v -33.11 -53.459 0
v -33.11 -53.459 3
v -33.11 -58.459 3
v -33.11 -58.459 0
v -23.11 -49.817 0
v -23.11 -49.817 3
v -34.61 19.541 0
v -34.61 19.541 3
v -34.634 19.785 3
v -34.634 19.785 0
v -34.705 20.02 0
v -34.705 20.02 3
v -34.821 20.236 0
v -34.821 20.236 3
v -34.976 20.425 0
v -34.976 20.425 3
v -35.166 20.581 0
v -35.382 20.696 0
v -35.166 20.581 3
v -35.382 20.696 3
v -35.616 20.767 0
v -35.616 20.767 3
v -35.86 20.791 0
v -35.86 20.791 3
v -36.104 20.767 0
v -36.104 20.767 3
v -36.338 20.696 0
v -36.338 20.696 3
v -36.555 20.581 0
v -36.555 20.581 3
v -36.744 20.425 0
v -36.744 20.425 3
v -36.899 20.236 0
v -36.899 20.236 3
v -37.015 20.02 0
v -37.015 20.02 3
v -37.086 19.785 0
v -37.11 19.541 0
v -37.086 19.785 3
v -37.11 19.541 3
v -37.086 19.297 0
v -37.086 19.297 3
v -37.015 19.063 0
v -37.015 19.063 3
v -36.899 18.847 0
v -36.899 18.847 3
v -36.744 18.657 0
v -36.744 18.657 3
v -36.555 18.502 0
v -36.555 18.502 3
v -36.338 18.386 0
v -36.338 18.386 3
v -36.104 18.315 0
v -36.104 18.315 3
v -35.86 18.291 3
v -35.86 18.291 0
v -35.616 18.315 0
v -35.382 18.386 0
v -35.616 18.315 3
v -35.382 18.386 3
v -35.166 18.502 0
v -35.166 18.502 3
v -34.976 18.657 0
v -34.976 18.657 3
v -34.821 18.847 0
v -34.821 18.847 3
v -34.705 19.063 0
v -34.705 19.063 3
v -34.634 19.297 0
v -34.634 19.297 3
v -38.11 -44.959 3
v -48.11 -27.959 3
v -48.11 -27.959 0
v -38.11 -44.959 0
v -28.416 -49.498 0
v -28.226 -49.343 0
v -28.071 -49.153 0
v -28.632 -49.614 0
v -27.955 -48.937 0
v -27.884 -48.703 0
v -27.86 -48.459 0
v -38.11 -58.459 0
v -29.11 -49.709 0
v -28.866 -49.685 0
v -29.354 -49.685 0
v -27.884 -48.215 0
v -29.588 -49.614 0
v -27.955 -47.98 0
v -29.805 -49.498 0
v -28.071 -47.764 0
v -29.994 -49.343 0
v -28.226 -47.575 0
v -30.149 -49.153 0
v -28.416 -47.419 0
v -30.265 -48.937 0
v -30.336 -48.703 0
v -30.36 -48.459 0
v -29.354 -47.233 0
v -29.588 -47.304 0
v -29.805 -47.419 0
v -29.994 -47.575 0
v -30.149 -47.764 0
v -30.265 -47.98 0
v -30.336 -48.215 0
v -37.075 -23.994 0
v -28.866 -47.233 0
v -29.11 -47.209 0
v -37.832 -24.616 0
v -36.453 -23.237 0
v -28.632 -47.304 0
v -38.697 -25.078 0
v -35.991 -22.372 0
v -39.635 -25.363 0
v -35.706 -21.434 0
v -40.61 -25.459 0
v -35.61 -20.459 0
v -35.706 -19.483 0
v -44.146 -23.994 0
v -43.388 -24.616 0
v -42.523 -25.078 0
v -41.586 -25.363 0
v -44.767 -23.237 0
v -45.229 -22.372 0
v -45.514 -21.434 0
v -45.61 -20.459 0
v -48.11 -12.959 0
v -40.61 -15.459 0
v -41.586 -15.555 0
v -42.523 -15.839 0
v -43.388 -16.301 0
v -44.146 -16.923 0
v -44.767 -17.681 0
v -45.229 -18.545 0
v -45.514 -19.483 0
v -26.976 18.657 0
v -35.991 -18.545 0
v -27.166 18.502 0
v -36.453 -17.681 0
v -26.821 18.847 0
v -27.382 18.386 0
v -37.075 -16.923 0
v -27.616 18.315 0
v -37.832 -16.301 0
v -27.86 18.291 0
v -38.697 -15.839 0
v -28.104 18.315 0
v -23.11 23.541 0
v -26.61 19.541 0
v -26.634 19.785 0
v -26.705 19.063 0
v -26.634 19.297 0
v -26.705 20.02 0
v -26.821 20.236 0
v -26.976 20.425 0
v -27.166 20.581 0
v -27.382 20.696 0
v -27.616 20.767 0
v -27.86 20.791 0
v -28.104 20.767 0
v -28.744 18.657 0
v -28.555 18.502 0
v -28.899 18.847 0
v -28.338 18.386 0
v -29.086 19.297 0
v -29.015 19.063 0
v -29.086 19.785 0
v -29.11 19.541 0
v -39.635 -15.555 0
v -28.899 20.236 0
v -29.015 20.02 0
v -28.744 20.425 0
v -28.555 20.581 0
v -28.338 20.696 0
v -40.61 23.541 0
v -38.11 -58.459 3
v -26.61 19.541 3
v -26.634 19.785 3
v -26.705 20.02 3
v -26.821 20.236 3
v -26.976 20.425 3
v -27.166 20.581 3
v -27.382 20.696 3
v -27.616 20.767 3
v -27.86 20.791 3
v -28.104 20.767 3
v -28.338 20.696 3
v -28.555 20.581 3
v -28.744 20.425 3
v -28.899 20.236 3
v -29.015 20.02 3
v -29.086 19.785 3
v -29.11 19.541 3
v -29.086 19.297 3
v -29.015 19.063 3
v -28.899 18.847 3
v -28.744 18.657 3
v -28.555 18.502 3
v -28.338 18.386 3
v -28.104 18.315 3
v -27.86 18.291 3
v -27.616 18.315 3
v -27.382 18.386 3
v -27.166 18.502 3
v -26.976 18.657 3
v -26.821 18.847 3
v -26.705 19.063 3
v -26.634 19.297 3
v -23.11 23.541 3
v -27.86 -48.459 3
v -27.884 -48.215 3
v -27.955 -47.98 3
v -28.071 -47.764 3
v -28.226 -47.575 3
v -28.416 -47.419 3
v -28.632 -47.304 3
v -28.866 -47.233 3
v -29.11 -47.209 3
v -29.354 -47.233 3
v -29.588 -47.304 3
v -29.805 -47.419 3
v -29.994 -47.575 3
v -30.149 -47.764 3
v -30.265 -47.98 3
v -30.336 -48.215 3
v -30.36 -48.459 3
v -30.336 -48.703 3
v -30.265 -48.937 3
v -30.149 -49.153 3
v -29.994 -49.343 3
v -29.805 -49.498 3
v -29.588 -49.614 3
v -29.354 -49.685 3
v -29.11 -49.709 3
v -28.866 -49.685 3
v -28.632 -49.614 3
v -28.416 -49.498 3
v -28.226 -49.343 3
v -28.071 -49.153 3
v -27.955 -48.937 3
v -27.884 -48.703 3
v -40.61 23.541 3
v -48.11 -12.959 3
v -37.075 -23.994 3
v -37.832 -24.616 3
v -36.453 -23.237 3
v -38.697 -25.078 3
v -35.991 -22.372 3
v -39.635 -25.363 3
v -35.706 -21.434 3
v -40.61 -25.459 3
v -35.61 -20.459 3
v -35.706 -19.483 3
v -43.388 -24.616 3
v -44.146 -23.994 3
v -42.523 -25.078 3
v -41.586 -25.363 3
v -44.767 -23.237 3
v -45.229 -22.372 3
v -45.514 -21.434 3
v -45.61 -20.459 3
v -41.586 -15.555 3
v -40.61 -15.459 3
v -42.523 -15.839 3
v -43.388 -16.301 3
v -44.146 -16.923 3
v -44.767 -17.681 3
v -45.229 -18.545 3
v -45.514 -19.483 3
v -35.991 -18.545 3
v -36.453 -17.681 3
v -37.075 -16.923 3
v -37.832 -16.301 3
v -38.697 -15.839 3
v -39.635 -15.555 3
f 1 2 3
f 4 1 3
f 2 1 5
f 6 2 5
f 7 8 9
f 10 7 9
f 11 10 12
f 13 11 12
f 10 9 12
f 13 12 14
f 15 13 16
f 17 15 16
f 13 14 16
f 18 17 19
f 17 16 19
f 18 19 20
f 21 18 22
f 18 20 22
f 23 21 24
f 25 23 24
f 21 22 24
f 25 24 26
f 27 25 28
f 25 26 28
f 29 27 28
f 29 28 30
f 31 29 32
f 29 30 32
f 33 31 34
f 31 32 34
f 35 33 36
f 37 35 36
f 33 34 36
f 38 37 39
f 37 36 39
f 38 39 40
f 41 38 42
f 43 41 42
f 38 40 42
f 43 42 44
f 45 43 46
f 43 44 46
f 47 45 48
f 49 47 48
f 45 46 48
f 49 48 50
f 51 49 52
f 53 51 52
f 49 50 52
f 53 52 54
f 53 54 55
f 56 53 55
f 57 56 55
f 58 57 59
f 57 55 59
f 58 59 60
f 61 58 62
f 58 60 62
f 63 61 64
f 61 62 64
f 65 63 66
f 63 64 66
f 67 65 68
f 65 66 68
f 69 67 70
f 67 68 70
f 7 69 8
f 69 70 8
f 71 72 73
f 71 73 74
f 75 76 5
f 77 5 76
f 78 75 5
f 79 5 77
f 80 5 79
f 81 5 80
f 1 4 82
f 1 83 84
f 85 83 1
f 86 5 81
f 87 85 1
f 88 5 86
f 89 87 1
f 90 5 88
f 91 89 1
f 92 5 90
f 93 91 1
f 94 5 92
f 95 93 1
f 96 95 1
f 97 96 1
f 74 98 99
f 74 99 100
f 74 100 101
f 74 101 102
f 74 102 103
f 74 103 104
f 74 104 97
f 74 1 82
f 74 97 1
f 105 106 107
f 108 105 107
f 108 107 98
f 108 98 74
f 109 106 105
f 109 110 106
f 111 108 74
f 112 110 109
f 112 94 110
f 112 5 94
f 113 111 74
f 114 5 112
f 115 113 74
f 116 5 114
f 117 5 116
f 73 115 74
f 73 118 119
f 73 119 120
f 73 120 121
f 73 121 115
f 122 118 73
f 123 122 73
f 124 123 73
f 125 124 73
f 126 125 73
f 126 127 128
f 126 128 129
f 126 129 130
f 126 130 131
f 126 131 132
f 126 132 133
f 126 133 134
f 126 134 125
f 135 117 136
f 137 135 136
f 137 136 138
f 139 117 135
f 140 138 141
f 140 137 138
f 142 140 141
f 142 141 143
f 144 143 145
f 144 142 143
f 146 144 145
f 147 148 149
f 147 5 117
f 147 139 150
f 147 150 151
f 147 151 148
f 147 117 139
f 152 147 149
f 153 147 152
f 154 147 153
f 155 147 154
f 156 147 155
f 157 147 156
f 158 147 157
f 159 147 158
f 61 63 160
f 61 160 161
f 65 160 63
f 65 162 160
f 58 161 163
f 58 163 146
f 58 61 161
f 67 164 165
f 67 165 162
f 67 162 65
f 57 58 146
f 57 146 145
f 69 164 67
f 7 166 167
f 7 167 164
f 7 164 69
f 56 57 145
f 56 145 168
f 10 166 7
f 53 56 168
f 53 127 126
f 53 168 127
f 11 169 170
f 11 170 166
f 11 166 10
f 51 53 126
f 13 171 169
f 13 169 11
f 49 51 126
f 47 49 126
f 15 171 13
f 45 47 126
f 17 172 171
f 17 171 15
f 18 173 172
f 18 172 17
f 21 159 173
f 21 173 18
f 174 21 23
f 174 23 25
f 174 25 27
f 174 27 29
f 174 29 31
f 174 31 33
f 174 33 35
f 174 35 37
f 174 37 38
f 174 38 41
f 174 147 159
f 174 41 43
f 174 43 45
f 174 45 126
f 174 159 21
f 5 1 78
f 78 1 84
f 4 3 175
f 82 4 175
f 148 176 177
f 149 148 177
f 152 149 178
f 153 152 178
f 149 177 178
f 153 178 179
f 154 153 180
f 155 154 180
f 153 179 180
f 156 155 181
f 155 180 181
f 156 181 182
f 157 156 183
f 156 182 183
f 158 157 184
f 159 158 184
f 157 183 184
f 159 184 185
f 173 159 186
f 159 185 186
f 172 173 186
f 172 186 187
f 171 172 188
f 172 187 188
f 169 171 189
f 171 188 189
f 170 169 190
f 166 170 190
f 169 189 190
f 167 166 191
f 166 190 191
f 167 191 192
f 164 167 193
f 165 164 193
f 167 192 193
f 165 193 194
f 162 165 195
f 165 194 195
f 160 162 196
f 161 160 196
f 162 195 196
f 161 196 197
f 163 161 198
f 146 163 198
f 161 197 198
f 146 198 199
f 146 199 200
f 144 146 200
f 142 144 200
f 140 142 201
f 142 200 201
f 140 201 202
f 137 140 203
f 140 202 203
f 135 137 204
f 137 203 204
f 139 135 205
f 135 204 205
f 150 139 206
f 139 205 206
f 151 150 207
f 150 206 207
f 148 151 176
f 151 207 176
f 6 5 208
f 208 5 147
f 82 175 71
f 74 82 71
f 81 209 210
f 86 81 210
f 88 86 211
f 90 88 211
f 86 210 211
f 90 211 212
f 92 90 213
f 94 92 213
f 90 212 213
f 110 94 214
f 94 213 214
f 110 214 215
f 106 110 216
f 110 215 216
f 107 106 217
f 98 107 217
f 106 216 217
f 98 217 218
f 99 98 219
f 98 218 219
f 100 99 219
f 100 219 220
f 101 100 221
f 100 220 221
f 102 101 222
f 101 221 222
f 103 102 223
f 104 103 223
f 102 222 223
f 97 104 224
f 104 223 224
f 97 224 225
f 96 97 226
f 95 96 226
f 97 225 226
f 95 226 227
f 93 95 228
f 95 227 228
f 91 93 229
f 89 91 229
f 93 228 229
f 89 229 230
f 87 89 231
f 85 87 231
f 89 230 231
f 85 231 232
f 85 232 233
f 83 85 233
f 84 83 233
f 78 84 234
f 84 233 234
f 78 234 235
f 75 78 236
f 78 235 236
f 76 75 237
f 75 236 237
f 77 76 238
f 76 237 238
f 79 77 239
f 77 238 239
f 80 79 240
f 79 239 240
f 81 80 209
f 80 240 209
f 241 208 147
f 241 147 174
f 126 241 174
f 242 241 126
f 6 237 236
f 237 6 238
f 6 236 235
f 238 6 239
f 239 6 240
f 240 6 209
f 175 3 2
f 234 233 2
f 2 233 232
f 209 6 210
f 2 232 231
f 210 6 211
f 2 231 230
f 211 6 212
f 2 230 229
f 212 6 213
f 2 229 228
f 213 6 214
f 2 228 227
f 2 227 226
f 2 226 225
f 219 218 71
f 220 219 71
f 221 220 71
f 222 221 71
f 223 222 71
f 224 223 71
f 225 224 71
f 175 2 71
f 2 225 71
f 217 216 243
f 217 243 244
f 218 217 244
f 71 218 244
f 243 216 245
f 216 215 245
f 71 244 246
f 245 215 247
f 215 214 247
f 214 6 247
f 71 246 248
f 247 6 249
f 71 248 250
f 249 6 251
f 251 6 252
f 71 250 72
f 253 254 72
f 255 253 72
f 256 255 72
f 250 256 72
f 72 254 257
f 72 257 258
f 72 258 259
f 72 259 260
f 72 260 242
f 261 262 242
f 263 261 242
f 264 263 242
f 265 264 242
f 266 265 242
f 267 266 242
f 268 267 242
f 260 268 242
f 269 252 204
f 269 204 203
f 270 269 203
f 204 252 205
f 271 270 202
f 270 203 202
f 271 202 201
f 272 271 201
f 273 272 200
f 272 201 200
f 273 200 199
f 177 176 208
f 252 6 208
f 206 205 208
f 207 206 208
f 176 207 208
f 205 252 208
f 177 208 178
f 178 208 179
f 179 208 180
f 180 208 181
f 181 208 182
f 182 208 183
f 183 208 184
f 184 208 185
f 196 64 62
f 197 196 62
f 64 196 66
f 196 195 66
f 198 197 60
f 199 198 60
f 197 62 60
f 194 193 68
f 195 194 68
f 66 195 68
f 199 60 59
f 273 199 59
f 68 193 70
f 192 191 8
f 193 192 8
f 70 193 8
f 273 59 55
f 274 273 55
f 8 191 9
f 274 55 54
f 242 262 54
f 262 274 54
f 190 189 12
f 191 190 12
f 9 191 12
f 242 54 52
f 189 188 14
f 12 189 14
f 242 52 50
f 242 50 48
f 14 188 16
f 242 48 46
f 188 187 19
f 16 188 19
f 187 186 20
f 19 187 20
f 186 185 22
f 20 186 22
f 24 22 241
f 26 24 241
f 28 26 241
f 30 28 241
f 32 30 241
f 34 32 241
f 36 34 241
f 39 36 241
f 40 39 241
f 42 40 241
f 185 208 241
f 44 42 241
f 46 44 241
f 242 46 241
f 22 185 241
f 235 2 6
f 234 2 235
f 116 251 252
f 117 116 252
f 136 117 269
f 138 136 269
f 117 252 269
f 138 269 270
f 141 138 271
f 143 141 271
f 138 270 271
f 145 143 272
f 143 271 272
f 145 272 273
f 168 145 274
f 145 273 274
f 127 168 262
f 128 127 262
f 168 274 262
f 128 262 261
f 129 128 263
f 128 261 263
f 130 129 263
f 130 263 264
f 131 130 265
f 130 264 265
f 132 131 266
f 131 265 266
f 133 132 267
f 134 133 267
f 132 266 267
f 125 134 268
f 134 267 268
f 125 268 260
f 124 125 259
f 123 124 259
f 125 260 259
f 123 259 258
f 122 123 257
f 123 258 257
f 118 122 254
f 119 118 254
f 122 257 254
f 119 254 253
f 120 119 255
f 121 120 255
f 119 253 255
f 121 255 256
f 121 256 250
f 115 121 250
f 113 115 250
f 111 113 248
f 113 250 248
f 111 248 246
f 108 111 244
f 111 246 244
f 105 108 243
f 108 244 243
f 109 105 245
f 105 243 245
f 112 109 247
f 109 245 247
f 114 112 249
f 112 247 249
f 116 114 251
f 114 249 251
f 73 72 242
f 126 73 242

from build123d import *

# Parameters (mm, degrees)
SKETCH1_W           = 10
SKETCH1_H           = 77
BOSS_EXTRUDE1_DEPTH = 3
SKETCH2_W           = 15
SKETCH2_H           = 15
BOSS_EXTRUDE2_DEPTH = 3
BOSS_EXTRUDE3_DEPTH = 3
BOSS_EXTRUDE4_DEPTH = 3
SKETCH5_R           = 5
SKETCH5_R_2         = 1.25
CUT_EXTRUDE1_DEPTH  = 3
CUT_EXTRUDE2_DEPTH  = 10


with BuildPart() as part:
    # Sketch1 → Boss-Extrude1 (new body)
    with BuildSketch(Plane.XY):
        with Locations((-28.110071178, -14.958795526)):
            Rectangle(SKETCH1_W, SKETCH1_H)
    extrude(amount=BOSS_EXTRUDE1_DEPTH)

    # Sketch2 → Boss-Extrude2 (add)
    with BuildSketch(Plane.XY.offset(3)):
        with Locations((-40.610071178, -20.458795526)):
            Rectangle(SKETCH2_W, SKETCH2_H)
    extrude(amount=-BOSS_EXTRUDE2_DEPTH)

    # Sketch3 → Boss-Extrude3 (add)
    with BuildSketch(Plane.XY.offset(3)):
        Polygon((-33.110071178, 23.541204474), (-40.610071178, 23.541204474), (-48.110071178, -12.958795526), (-33.110071178, -12.958795526), align=None)
        Polygon((-48.110071178, -27.958795526), (-33.110071178, -53.458795526), (-33.110071178, -27.958795526), align=None)
    extrude(amount=-BOSS_EXTRUDE3_DEPTH)

    # Sketch4 → Boss-Extrude4 (add)
    with BuildSketch(Plane.XY.offset(3)):
        Polygon((-33.110071178, -53.458795526), (-33.110071178, -58.458795526), (-38.110071178, -58.458795526), (-38.110071178, -44.958795526), align=None)
    extrude(amount=-BOSS_EXTRUDE4_DEPTH)

    # Sketch5 → Cut-Extrude1 (cut)
    with BuildSketch(Plane.XY.offset(3)):
        with Locations((-40.610071178, -20.458795526)):
            Circle(SKETCH5_R)
        with Locations((-29.110071178, -48.458795526)):
            Circle(SKETCH5_R_2)
        with Locations((-35.860071178, 19.541204474)):
            Circle(SKETCH5_R_2)
        with Locations((-27.860071178, 19.541204474)):
            Circle(SKETCH5_R_2)
    extrude(amount=-CUT_EXTRUDE1_DEPTH, mode=Mode.SUBTRACT)

    # Sketch6 → Cut-Extrude2 (cut)
    with BuildSketch(Plane(origin=(0, 0, 0), x_dir=(-1, 0, 0), z_dir=(0, 0, -1))):
        Polygon((23.110071178, -49.817142067), (23.110071178, -53.458795526), (33.110071178, -53.458795526), align=None)
    extrude(amount=-CUT_EXTRUDE2_DEPTH, mode=Mode.SUBTRACT)


solid = part.part
